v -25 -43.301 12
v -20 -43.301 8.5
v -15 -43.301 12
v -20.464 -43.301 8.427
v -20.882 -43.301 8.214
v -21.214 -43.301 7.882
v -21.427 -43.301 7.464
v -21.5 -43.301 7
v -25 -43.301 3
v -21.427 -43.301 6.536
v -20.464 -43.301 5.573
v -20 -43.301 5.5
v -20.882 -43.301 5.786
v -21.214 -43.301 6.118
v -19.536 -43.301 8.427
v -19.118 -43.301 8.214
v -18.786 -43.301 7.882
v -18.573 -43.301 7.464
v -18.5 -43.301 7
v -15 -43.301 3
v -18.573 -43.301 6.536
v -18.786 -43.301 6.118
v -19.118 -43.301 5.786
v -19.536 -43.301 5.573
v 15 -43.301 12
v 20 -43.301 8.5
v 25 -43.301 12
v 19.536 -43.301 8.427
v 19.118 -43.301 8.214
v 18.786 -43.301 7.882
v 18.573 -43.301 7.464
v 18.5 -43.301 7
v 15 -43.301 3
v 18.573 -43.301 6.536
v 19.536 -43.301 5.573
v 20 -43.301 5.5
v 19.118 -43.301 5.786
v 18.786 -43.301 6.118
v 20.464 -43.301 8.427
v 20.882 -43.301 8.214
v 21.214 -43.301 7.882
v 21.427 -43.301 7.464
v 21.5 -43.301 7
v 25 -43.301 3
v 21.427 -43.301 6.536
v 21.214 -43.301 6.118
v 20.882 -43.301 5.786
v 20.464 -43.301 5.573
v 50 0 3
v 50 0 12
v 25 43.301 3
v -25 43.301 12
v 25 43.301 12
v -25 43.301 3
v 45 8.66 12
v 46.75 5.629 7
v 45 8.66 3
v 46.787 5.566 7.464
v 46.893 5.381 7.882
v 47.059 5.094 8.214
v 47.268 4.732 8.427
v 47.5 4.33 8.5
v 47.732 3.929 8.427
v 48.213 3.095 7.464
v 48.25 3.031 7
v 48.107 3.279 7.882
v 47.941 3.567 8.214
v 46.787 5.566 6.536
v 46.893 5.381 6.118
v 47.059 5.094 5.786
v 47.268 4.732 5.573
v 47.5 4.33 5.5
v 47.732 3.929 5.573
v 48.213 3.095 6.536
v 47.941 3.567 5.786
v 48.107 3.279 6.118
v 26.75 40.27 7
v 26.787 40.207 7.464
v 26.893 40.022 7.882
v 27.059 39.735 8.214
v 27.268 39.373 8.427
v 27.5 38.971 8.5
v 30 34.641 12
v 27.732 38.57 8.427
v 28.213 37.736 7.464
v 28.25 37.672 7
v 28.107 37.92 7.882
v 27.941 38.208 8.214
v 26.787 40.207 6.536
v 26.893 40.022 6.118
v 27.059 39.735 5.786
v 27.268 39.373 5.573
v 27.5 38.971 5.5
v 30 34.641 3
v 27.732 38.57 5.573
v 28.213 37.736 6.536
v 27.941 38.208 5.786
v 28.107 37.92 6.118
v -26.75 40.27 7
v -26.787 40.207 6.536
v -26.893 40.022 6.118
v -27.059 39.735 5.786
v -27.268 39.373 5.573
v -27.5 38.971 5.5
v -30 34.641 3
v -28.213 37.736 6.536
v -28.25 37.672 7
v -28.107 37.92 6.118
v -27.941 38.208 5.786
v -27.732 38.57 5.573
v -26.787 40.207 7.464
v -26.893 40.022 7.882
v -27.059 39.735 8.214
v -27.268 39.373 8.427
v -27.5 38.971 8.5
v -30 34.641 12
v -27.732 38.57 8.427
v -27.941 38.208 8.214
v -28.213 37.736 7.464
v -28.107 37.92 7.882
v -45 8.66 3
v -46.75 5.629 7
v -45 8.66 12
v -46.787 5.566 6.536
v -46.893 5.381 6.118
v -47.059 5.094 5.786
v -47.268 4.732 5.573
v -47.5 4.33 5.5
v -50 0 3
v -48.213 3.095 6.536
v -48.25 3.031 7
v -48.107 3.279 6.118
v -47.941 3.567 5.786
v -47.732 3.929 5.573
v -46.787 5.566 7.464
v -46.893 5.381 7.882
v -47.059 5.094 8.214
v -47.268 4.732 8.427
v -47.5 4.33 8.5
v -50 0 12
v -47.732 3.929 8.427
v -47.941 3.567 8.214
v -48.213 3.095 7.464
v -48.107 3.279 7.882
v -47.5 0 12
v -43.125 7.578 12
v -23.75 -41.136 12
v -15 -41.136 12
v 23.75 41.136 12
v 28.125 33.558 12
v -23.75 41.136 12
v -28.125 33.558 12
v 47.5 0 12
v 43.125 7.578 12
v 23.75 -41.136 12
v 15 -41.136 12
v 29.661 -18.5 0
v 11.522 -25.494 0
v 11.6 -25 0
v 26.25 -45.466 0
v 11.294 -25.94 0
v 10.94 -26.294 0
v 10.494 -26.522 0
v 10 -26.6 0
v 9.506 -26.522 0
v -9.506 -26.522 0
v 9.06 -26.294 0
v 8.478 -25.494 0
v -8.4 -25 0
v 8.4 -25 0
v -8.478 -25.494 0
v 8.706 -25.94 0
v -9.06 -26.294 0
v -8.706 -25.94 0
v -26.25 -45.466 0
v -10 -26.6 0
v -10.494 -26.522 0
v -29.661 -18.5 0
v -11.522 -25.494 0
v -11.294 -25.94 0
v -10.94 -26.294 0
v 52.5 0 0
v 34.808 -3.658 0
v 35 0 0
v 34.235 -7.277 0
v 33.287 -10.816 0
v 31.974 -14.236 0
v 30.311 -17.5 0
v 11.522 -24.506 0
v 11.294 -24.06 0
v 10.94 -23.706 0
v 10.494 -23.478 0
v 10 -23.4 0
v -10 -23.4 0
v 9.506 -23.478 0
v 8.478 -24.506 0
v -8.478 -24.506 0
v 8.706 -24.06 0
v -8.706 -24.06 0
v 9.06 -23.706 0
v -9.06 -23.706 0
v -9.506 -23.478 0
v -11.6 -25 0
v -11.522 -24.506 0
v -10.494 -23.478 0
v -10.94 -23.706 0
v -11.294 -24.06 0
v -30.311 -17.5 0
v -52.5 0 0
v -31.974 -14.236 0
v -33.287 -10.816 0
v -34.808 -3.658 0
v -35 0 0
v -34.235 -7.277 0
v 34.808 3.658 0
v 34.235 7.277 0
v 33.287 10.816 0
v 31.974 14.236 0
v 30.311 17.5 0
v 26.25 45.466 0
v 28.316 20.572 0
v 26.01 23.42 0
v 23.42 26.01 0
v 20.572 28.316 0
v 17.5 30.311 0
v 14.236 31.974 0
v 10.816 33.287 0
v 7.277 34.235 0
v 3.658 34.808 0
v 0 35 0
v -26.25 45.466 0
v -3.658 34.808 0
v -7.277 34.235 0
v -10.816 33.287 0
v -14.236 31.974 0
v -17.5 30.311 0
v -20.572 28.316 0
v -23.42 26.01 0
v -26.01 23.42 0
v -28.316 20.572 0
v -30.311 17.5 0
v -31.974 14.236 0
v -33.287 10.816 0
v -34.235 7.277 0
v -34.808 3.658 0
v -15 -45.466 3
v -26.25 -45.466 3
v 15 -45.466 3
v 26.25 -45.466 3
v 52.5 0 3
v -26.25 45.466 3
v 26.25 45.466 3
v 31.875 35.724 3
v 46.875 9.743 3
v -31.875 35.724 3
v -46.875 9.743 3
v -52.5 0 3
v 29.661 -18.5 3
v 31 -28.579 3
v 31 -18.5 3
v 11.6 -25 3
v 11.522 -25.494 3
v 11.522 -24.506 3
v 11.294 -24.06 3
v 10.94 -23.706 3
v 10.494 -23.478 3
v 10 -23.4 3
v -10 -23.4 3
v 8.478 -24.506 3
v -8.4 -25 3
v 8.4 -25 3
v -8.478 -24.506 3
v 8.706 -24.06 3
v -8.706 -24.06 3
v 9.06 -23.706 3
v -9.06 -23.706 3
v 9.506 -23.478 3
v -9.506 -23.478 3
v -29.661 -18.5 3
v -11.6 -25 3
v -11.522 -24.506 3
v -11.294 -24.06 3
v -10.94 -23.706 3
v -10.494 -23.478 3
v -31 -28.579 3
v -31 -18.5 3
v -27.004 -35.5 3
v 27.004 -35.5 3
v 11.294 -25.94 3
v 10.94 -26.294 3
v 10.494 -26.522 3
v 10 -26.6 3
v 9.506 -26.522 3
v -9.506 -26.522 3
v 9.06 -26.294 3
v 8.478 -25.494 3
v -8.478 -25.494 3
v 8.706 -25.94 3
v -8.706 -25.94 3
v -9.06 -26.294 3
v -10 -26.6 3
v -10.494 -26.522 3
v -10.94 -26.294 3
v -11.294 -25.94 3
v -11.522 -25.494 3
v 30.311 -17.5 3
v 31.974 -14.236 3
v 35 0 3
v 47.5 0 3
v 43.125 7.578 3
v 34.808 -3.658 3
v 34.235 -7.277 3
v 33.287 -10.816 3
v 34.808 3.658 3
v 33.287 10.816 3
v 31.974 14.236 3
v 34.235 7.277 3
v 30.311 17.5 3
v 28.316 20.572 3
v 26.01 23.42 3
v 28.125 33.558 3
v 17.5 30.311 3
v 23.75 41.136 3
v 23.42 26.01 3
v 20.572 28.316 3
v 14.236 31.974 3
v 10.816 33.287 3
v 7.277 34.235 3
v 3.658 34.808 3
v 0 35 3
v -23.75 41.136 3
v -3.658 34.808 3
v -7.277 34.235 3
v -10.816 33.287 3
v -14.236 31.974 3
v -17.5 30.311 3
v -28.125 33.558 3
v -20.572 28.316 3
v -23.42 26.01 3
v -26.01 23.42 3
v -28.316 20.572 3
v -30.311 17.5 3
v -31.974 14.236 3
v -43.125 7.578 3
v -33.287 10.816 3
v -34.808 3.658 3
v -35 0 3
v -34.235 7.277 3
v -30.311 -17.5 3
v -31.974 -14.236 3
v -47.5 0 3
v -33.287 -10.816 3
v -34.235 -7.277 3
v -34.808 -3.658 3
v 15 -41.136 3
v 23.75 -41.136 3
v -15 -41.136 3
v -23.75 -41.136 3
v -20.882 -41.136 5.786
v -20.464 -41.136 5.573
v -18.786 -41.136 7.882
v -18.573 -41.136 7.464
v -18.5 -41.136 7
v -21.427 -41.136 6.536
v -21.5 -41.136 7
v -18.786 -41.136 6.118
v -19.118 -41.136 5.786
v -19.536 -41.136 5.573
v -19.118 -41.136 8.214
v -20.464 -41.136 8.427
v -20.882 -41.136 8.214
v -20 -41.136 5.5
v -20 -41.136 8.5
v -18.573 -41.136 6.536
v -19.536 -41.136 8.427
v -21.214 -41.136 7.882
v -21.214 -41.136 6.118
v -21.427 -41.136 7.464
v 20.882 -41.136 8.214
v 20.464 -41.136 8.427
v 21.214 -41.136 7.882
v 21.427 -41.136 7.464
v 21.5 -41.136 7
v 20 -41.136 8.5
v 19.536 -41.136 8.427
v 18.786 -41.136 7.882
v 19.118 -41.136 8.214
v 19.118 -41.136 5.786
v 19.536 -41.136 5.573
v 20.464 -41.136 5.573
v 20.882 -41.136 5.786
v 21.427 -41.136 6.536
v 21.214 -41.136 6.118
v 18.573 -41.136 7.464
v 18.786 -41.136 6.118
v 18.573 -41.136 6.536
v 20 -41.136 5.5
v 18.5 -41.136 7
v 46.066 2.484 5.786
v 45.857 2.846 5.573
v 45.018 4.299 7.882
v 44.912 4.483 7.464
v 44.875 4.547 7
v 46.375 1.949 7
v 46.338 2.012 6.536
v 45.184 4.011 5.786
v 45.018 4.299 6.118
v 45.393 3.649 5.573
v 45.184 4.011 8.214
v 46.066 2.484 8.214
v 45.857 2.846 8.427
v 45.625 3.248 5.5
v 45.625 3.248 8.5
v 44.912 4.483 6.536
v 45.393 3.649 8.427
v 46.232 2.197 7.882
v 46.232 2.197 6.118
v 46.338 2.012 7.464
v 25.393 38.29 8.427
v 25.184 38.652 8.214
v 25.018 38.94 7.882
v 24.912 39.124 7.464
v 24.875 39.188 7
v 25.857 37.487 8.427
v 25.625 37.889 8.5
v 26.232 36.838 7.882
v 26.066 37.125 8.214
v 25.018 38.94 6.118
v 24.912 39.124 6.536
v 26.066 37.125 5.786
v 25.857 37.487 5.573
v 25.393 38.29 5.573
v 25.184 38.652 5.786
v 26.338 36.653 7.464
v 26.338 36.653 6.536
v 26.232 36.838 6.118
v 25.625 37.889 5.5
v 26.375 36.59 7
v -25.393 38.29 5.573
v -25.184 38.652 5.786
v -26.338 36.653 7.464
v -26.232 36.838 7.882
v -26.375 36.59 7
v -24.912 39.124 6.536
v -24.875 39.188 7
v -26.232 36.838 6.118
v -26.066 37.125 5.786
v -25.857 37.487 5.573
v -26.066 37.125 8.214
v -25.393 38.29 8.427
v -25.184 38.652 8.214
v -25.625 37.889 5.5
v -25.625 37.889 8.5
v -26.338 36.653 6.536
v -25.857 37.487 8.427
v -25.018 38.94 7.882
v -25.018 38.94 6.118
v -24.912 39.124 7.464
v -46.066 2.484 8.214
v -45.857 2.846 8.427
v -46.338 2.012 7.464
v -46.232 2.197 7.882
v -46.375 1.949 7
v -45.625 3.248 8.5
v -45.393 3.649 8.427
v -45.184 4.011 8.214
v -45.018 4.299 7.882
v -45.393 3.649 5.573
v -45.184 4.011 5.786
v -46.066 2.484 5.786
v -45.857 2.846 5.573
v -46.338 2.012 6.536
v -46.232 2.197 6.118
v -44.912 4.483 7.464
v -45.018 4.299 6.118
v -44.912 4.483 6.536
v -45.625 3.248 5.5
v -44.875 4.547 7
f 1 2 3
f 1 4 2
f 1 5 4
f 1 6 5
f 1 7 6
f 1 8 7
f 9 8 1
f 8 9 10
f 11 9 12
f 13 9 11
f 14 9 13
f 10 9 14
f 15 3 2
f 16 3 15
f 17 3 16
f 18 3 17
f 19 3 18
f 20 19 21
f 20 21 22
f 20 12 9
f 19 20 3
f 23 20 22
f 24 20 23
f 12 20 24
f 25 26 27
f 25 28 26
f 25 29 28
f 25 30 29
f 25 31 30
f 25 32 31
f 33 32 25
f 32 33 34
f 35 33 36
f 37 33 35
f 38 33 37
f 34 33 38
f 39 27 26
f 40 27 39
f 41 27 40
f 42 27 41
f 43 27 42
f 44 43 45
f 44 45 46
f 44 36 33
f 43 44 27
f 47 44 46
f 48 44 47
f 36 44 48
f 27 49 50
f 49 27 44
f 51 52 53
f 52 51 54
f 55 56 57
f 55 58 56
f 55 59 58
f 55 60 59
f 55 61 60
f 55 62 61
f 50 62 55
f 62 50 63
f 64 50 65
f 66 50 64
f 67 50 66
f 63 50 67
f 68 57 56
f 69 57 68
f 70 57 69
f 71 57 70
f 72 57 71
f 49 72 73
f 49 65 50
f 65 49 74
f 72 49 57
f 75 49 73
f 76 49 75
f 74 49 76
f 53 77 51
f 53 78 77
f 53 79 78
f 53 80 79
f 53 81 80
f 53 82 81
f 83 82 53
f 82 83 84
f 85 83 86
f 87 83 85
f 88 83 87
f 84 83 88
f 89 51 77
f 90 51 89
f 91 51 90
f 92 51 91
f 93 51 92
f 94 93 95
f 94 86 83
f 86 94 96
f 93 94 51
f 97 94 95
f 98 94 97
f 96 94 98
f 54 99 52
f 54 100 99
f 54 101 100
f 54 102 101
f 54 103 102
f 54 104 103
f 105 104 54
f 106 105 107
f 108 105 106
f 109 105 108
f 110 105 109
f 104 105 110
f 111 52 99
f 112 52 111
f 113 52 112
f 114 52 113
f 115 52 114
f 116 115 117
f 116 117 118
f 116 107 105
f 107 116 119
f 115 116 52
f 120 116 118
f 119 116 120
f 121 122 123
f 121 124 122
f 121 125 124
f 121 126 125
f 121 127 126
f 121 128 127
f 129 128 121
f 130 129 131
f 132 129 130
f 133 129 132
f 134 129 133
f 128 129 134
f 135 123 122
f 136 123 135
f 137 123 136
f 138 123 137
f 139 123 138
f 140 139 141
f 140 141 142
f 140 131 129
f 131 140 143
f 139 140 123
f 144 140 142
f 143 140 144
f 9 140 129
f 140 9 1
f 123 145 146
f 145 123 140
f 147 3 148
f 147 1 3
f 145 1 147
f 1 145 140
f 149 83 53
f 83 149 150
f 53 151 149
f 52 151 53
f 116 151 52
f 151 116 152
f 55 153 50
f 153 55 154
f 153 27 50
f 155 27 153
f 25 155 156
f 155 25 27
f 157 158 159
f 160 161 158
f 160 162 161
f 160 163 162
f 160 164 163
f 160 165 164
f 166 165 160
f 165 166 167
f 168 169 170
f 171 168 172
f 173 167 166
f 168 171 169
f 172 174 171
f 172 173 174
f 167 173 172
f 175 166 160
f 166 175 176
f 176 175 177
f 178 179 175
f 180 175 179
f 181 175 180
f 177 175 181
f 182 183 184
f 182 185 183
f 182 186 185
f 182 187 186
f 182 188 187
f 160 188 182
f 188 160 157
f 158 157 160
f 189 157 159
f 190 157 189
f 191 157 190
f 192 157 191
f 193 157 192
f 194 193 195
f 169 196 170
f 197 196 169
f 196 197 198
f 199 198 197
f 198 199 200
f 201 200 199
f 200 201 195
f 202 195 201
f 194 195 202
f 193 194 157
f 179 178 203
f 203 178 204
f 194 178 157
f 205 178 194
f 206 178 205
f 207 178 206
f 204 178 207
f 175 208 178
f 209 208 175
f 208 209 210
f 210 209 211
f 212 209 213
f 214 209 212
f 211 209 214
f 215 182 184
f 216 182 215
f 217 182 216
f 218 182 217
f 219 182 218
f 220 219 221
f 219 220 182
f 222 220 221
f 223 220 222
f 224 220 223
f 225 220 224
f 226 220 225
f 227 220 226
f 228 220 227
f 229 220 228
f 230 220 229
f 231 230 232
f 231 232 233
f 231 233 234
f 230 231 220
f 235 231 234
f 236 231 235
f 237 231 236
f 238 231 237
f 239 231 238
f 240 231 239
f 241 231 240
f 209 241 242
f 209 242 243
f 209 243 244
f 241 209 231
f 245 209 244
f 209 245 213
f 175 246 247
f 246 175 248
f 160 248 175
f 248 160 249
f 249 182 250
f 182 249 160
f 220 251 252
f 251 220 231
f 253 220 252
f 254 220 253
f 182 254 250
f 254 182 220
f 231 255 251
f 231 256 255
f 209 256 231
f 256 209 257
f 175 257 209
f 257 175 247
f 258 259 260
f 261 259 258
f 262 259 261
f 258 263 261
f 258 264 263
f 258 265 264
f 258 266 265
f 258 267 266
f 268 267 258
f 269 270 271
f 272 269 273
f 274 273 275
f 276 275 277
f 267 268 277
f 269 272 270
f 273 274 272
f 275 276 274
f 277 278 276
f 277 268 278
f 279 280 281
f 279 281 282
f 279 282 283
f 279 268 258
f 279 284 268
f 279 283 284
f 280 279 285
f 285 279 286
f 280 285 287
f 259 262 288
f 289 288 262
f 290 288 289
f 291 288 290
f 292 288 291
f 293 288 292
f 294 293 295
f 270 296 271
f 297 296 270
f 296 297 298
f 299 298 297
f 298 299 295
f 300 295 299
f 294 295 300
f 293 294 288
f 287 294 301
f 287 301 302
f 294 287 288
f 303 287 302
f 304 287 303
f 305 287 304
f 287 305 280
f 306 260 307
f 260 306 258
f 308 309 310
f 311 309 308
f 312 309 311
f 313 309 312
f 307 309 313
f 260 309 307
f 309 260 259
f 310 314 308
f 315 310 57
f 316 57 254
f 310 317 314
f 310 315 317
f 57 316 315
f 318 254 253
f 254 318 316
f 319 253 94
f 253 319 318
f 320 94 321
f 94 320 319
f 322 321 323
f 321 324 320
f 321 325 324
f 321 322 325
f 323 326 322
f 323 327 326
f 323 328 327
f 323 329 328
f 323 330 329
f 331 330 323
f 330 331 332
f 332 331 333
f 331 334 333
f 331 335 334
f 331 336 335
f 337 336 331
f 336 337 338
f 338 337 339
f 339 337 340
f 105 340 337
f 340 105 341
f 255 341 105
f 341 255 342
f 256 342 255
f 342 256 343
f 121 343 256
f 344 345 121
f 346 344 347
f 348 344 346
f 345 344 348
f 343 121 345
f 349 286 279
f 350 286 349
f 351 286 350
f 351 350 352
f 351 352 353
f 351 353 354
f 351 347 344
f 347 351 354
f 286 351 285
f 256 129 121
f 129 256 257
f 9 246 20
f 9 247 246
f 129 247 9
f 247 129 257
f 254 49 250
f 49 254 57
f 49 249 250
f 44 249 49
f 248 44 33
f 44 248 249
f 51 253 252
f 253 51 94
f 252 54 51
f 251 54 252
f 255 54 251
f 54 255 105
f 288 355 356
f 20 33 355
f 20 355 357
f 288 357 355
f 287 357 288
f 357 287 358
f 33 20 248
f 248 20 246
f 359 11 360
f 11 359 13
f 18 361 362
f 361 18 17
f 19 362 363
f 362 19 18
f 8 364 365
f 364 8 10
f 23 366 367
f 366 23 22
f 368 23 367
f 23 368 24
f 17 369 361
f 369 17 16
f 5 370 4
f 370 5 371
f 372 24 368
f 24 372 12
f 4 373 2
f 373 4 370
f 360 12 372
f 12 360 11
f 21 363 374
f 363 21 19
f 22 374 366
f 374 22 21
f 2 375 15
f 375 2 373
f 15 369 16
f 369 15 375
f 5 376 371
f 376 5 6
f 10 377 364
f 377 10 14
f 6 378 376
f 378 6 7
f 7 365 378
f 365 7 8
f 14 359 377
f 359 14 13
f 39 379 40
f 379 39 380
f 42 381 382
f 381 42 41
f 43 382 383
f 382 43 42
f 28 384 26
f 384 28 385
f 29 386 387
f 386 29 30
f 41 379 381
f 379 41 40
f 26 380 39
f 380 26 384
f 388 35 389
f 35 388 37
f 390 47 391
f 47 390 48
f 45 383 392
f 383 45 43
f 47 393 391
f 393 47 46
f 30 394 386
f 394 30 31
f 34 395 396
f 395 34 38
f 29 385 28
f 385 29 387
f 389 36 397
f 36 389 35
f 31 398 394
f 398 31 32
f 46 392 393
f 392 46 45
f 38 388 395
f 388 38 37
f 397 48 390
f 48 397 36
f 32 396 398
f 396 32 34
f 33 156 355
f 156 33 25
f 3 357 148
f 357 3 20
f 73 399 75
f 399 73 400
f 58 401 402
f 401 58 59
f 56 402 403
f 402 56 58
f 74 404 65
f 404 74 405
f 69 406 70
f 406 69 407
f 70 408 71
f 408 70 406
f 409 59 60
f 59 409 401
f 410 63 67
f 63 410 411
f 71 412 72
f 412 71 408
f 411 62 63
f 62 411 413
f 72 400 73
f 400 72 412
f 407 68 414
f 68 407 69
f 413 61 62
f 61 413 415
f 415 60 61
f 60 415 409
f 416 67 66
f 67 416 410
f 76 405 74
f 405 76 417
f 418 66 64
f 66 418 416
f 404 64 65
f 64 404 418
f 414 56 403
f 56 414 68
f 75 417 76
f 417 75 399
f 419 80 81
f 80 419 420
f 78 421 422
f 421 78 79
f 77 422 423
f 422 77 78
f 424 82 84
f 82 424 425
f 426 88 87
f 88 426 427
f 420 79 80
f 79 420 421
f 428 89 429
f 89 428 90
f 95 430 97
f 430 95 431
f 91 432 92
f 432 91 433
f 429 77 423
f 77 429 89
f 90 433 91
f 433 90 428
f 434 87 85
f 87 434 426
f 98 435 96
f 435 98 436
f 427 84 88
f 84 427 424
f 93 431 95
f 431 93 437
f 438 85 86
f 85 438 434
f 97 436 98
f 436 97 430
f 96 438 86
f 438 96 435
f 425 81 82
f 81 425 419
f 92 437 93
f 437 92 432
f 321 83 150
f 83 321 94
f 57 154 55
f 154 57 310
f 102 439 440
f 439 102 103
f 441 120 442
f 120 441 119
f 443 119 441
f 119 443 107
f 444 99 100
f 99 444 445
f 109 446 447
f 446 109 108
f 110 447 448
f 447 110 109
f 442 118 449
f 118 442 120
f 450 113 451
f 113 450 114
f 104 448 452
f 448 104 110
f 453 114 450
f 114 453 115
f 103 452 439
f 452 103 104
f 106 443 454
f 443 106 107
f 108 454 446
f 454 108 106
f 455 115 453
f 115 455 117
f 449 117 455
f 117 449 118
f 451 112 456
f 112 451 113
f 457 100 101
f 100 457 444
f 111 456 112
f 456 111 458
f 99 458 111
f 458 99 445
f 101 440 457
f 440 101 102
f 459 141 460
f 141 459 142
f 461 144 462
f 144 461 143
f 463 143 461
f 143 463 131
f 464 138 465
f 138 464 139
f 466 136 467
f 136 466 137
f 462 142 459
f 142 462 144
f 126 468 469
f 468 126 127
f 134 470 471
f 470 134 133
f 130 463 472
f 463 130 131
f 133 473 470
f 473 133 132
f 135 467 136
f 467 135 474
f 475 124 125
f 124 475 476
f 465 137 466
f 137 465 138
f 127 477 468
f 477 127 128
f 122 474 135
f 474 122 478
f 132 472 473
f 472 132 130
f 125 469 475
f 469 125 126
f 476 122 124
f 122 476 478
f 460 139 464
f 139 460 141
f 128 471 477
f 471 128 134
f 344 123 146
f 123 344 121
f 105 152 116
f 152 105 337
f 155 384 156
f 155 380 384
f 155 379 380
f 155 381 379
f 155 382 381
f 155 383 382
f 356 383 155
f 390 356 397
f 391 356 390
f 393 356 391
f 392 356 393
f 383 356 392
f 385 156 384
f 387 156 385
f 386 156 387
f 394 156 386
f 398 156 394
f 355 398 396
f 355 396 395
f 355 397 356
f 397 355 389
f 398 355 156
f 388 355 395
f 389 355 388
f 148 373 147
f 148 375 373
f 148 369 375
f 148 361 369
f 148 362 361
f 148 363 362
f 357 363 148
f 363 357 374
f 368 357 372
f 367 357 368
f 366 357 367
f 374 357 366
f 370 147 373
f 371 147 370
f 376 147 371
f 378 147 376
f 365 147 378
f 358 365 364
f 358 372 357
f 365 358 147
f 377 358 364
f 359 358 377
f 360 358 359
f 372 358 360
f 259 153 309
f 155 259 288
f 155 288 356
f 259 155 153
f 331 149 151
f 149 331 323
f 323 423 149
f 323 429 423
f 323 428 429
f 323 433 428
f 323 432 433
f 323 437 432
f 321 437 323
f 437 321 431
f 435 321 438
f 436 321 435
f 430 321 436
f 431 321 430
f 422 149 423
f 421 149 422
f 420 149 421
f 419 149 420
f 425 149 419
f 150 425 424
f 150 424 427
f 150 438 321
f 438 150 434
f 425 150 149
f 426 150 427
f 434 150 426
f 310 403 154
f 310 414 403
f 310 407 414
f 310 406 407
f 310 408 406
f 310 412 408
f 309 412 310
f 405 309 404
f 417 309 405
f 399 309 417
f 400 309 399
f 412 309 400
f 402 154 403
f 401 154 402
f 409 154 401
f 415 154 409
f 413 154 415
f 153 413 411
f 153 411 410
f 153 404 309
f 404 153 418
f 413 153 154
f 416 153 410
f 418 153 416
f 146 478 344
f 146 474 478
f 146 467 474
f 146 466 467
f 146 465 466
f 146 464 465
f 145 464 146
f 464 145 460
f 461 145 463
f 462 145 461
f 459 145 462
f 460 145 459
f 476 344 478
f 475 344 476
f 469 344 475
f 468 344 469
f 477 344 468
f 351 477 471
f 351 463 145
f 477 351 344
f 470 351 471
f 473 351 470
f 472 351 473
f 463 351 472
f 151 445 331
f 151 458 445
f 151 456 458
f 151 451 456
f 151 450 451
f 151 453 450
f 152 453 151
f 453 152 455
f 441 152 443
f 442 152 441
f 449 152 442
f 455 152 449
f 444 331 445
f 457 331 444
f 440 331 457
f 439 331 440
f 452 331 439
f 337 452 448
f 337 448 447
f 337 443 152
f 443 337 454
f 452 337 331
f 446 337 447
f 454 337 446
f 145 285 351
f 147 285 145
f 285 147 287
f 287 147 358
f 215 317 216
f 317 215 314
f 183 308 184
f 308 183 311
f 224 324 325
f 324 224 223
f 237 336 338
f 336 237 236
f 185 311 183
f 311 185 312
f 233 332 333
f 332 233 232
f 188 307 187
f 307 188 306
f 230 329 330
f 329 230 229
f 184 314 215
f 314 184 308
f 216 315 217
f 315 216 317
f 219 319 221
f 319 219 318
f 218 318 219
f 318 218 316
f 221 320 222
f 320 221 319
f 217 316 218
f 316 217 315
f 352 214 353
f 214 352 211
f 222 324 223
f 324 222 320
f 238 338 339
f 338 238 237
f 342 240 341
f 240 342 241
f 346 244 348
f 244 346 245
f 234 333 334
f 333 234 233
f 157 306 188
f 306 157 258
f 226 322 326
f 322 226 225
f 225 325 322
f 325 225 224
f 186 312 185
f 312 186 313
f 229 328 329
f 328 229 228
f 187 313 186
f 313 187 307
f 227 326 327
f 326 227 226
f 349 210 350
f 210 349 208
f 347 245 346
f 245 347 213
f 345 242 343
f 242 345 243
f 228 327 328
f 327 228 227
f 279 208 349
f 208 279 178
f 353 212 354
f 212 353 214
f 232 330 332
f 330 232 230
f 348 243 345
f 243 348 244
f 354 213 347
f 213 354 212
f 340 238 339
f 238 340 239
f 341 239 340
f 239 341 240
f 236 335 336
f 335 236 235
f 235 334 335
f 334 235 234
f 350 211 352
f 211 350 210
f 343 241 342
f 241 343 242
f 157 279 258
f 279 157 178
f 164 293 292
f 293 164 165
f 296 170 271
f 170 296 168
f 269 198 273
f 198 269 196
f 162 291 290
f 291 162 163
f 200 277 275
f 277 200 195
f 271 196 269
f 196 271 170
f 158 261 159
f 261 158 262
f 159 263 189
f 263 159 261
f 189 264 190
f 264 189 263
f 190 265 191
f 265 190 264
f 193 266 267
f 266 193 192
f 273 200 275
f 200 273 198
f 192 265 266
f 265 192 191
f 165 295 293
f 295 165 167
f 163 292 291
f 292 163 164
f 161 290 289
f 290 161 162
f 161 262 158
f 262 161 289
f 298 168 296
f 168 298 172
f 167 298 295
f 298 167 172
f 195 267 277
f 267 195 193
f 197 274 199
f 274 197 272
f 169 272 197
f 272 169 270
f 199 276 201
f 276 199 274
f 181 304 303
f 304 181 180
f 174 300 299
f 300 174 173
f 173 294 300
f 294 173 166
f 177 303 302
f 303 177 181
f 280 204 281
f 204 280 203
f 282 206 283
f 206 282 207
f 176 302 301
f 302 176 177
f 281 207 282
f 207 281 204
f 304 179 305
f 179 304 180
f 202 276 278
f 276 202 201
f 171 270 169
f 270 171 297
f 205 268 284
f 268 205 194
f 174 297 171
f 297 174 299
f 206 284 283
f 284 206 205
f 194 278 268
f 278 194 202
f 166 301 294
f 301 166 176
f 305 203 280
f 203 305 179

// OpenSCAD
$fn=20;
difference(){
union(){    
    cylinder(d=100,h=12,$fn=6);
    cylinder(d=105,h=3,$fn=6);
}
    translate([0,0,3])
    cylinder(d=95,h=12,$fn=6);
    cylinder(d=70,h=12,$fn=60);
for(i=[0:120:300]){
 rotate([0,0,i]){
    translate([-20,0,7])rotate([90,0,0])
    cylinder(d=3,h=100);
    translate([20,0,7])rotate([90,0,0])
    cylinder(d=3,h=100);
    translate([-15,-120,3])cube([30,120,10]);
}
}
}

difference(){
translate([0,-27,1.5])cube([62,17,3],center=true);
translate([10,-25,0]) cylinder(d=3.2,h=3);
translate([-10,-25,0]) cylinder(d=3.2,h=3);
}
